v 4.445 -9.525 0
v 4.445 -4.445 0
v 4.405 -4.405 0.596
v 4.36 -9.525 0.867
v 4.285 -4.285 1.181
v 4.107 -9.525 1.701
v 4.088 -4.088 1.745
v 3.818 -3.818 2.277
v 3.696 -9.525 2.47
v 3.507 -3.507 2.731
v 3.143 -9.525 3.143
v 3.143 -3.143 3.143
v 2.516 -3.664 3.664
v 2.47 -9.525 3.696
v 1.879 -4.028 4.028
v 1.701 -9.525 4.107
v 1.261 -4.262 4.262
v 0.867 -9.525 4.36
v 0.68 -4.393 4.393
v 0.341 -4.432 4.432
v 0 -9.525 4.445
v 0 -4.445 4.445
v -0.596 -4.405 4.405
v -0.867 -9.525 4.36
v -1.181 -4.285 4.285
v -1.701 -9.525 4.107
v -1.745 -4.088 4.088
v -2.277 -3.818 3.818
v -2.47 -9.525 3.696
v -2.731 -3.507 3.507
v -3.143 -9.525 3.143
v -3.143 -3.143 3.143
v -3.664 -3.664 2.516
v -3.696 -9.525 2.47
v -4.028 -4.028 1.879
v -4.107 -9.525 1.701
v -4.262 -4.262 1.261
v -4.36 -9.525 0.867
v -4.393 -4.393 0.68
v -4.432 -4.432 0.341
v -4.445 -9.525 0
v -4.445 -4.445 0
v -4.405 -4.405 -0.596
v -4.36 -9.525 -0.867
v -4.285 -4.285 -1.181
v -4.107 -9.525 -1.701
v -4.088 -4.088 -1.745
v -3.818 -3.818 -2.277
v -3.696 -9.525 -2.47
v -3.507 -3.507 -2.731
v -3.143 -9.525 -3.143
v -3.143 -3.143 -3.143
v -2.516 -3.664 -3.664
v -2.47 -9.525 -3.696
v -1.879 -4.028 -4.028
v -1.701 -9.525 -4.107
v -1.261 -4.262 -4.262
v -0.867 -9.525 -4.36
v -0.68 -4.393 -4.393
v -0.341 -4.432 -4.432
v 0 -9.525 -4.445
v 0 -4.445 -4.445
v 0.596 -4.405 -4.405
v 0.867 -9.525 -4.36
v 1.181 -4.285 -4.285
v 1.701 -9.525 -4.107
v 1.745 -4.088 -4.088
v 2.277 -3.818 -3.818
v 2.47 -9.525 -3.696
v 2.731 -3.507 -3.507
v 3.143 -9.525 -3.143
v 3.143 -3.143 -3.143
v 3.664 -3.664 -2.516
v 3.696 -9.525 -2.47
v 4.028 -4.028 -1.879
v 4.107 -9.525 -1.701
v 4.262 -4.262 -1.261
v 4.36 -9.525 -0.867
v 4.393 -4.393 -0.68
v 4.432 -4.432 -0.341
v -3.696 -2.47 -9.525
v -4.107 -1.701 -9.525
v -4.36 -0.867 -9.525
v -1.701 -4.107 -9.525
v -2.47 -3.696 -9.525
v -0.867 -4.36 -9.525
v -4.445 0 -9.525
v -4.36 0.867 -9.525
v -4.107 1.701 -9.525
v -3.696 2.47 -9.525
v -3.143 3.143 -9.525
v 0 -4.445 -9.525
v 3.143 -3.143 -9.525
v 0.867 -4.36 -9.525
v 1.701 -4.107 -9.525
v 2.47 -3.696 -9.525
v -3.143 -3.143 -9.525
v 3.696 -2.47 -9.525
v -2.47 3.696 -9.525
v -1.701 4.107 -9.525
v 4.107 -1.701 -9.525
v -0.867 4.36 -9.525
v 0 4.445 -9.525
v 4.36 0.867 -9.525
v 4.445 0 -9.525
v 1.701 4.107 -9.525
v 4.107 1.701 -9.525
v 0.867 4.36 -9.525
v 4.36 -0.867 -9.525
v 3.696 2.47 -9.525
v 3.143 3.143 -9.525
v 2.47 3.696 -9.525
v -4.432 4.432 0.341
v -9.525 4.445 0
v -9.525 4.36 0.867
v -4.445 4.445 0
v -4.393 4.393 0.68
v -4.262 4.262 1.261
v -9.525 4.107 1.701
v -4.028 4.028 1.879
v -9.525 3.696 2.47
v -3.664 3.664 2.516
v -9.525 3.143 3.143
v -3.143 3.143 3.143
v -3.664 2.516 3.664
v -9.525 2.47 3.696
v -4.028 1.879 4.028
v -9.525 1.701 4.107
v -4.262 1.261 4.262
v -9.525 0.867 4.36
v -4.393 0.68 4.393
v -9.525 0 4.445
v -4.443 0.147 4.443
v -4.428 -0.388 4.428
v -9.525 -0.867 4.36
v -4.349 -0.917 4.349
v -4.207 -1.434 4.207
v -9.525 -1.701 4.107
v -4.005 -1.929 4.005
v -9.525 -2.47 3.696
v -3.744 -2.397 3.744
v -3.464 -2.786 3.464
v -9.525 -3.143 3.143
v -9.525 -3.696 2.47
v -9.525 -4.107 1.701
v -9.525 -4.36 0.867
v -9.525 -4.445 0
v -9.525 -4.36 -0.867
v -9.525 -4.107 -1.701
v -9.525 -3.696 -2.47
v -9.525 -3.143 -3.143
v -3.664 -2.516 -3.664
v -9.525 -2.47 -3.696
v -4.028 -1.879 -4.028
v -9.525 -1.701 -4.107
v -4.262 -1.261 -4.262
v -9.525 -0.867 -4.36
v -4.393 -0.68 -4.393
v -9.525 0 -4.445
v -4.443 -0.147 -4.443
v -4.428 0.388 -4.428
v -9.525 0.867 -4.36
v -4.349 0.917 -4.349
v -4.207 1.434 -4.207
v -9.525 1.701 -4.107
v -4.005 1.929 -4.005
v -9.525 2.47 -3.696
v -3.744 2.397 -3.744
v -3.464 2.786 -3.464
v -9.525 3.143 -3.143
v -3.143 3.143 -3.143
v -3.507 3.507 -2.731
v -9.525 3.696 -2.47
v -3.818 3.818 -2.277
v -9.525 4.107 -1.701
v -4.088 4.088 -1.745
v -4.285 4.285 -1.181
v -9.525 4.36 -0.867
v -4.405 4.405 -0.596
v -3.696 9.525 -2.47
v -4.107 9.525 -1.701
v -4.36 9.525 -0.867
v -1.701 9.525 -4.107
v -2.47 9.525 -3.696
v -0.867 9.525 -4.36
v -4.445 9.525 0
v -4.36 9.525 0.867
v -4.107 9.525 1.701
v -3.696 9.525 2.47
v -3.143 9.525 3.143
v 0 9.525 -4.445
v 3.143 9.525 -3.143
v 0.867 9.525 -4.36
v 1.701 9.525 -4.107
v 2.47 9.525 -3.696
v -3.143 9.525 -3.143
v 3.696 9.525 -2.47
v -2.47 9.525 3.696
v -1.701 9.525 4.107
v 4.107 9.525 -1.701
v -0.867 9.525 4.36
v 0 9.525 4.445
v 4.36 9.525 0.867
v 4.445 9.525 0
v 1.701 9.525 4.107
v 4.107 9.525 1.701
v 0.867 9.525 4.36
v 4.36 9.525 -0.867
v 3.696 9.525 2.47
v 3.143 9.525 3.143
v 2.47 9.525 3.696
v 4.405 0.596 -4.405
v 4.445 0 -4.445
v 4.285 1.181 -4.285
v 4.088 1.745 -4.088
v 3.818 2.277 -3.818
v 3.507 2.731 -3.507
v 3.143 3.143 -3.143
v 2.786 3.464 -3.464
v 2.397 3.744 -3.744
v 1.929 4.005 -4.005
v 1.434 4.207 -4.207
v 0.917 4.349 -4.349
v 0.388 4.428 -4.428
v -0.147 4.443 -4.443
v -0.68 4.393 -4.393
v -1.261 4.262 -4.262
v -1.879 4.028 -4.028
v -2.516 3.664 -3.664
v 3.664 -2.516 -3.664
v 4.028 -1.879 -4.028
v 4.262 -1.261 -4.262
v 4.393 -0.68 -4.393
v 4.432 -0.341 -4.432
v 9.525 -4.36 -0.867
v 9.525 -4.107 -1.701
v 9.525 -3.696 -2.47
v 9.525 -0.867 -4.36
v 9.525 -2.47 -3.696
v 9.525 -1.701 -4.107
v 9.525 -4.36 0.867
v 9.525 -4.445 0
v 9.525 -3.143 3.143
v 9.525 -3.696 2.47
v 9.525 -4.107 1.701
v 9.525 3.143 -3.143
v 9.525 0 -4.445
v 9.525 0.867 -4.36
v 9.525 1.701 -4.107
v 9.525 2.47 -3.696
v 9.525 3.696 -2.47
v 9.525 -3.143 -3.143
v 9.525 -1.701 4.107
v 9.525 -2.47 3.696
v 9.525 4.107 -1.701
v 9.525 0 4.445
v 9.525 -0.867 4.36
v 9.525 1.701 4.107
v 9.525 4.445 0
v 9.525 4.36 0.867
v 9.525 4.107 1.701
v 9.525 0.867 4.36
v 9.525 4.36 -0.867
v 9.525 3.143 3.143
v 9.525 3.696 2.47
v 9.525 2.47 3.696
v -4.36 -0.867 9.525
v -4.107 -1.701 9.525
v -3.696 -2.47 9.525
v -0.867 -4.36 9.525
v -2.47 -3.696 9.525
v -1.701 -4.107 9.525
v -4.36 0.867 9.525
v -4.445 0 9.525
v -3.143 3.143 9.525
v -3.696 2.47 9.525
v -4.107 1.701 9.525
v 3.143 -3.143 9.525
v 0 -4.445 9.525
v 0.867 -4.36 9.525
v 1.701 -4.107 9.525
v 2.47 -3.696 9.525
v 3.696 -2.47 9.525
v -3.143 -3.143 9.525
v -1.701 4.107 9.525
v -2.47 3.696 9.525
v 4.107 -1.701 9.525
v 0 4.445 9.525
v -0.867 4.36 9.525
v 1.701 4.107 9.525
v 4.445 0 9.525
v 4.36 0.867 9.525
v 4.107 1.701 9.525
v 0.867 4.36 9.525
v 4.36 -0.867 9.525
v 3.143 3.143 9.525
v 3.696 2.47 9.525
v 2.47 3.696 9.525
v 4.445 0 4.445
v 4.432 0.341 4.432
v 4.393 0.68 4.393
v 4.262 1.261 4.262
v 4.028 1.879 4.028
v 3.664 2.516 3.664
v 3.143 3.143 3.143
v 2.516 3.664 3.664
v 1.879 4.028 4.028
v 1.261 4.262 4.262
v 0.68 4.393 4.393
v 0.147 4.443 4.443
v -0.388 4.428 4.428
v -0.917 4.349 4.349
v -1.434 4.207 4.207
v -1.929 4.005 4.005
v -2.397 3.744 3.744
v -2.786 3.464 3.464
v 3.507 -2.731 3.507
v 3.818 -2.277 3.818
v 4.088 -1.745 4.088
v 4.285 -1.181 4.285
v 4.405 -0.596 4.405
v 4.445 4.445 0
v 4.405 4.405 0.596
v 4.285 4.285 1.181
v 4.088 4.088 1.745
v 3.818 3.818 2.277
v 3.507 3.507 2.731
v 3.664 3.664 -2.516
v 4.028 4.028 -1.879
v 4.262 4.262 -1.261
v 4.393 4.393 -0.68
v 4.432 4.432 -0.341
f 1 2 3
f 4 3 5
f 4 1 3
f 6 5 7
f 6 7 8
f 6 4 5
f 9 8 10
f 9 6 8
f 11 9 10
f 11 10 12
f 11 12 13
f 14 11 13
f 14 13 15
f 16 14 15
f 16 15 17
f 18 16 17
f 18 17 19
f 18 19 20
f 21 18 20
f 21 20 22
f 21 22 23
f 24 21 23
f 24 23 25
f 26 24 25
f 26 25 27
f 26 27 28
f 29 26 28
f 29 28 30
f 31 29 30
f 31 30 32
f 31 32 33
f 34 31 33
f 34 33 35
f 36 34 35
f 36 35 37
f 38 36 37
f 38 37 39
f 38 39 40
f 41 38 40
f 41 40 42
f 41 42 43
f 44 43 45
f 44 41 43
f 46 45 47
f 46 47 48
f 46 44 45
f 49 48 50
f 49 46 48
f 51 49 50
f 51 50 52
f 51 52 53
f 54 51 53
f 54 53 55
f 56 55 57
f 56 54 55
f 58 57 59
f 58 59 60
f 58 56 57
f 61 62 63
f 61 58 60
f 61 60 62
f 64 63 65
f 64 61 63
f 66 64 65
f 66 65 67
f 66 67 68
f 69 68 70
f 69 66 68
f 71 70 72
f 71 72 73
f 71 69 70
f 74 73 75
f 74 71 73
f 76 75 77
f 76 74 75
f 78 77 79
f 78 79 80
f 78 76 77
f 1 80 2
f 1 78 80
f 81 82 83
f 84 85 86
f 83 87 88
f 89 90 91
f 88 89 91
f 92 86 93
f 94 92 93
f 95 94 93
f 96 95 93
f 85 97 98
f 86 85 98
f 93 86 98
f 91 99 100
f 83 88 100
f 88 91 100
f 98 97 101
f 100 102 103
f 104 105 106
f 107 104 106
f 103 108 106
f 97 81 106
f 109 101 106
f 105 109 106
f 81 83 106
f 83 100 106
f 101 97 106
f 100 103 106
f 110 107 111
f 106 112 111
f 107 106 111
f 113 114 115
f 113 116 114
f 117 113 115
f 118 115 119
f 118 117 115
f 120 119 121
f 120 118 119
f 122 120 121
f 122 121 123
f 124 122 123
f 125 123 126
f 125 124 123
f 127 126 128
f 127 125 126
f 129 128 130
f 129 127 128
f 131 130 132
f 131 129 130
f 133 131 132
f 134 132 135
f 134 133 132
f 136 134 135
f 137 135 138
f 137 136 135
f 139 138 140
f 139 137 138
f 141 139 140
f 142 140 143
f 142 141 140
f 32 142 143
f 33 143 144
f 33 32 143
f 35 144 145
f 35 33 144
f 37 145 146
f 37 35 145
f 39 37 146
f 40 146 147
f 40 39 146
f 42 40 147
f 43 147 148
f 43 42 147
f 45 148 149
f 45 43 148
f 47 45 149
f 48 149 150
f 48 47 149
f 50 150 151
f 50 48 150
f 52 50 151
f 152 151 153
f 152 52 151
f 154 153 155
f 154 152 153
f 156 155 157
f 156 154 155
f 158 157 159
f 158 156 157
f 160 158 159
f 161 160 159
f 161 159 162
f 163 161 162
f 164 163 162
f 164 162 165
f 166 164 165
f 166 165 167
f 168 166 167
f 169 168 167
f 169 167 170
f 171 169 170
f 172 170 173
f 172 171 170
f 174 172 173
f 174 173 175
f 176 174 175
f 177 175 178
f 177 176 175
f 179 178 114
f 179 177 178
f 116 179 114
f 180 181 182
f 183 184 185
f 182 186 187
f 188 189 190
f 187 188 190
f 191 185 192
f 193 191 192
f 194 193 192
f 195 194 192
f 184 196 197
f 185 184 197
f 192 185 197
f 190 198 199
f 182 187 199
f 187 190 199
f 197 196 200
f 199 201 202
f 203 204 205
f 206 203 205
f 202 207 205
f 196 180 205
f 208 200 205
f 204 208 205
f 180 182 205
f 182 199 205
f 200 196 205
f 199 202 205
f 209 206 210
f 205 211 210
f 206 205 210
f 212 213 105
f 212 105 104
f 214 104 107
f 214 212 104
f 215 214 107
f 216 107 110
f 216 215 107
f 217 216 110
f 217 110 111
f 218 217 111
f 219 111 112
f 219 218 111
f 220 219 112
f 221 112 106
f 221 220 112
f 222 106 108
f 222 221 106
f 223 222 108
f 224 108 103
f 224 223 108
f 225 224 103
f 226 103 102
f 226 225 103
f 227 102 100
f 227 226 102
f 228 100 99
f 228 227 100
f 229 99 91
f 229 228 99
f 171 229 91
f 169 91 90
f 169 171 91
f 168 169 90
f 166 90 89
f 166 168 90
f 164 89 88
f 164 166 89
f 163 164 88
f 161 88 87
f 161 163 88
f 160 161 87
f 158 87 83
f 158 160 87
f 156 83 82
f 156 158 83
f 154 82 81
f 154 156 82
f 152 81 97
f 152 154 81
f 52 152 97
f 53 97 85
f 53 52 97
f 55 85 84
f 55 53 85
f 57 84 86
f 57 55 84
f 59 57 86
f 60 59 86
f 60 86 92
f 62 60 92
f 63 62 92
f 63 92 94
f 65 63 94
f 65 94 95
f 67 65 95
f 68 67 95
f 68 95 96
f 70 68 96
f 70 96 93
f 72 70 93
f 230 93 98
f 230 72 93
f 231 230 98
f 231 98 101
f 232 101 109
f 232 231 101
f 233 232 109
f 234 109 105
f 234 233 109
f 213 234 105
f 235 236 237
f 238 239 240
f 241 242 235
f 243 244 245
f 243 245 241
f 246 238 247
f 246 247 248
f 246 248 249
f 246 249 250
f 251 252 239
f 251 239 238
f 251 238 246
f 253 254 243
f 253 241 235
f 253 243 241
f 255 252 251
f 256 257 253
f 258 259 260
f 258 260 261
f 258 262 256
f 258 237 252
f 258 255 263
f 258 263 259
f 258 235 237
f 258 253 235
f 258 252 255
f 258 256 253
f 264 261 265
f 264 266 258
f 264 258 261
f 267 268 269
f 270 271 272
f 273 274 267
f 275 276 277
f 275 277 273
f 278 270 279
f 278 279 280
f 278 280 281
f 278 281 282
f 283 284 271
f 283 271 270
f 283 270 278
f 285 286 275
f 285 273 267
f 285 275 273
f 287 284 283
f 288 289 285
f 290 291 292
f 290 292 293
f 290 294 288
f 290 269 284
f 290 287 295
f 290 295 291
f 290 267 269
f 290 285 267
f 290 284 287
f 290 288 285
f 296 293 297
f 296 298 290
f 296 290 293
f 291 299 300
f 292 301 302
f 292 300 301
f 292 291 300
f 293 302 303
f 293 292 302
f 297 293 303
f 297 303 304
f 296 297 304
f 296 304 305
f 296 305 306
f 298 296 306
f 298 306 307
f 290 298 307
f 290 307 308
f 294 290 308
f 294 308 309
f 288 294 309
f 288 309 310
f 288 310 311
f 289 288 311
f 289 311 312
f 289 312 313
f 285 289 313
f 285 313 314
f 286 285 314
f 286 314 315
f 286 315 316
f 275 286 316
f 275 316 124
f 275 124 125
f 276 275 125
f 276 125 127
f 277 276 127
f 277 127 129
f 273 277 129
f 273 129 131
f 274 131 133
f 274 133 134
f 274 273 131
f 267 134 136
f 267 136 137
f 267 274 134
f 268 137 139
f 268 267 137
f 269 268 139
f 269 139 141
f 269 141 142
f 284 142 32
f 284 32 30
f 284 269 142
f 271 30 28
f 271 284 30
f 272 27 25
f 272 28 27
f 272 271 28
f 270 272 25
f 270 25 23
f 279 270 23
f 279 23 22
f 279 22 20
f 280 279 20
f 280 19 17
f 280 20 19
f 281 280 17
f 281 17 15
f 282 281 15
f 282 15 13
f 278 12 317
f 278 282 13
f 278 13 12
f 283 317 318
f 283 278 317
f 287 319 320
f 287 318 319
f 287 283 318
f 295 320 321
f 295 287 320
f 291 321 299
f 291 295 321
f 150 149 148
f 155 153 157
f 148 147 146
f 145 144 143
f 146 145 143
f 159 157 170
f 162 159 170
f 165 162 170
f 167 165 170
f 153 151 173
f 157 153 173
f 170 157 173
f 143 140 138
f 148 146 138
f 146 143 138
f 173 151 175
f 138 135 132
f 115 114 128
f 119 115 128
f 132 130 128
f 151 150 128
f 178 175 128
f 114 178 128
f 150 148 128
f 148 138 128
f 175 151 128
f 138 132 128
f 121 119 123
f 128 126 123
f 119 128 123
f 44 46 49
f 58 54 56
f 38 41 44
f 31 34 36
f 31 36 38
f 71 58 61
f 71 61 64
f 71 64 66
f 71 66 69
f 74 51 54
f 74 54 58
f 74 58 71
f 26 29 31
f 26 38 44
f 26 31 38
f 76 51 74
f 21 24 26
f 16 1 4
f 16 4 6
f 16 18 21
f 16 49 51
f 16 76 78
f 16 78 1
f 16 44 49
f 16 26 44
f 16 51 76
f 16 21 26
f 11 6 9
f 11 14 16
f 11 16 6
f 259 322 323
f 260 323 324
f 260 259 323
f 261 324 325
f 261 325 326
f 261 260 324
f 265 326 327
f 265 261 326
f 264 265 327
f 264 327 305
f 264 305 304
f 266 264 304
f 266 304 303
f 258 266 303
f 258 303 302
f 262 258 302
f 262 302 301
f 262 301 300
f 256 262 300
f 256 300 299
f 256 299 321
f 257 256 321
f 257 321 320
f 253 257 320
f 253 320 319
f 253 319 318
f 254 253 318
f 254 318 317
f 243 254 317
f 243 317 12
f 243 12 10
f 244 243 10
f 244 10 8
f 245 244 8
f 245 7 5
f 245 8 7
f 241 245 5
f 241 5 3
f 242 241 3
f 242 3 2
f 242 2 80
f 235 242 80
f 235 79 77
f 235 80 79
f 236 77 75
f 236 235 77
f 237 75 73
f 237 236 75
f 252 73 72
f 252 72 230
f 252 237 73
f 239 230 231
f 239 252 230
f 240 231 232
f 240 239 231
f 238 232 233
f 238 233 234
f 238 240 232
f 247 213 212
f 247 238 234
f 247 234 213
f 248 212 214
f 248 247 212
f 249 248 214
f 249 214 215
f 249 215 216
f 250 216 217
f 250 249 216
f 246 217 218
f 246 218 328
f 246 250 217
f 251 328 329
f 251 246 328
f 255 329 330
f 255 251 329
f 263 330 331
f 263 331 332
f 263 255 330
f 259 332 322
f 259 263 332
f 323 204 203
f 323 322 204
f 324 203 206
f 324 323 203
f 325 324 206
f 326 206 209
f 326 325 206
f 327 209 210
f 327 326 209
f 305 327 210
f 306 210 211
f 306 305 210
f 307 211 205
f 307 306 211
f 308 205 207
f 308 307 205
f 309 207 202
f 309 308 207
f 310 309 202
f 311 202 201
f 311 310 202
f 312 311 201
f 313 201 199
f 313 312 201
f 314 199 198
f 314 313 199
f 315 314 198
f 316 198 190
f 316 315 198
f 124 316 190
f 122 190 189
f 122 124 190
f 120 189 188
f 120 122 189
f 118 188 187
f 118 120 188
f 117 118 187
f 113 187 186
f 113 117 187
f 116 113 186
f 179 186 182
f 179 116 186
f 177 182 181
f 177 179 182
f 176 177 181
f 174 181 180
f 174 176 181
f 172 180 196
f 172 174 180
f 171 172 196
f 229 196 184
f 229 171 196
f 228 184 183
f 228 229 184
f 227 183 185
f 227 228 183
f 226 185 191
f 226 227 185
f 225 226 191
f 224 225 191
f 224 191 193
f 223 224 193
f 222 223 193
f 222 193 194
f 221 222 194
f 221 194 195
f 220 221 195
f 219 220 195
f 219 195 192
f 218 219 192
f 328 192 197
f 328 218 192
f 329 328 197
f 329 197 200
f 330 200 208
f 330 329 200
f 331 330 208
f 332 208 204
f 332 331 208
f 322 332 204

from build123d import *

# Parameters (mm, degrees)
F0_R     = 4.445
F1_DEPTH = 9.525
F2_R     = 4.445
F3_DEPTH = 9.525
F4_R     = 4.445
F5_DEPTH = 9.525


with BuildPart() as f1:
    # F0 (on Front) → F1 (new body, symmetric)
    with BuildSketch(Plane.XZ):
        Circle(F0_R)
    extrude(amount=F1_DEPTH, both=True)

    # F2 (on Right) → F3 (join, symmetric)
    with BuildSketch(Plane.YZ):
        Circle(F2_R)
    extrude(amount=F3_DEPTH, both=True)

    # F4 (on Top) → F5 (join, symmetric)
    with BuildSketch(Plane.XY):
        Circle(F4_R)
    extrude(amount=F5_DEPTH, both=True)


solid = f1.part
